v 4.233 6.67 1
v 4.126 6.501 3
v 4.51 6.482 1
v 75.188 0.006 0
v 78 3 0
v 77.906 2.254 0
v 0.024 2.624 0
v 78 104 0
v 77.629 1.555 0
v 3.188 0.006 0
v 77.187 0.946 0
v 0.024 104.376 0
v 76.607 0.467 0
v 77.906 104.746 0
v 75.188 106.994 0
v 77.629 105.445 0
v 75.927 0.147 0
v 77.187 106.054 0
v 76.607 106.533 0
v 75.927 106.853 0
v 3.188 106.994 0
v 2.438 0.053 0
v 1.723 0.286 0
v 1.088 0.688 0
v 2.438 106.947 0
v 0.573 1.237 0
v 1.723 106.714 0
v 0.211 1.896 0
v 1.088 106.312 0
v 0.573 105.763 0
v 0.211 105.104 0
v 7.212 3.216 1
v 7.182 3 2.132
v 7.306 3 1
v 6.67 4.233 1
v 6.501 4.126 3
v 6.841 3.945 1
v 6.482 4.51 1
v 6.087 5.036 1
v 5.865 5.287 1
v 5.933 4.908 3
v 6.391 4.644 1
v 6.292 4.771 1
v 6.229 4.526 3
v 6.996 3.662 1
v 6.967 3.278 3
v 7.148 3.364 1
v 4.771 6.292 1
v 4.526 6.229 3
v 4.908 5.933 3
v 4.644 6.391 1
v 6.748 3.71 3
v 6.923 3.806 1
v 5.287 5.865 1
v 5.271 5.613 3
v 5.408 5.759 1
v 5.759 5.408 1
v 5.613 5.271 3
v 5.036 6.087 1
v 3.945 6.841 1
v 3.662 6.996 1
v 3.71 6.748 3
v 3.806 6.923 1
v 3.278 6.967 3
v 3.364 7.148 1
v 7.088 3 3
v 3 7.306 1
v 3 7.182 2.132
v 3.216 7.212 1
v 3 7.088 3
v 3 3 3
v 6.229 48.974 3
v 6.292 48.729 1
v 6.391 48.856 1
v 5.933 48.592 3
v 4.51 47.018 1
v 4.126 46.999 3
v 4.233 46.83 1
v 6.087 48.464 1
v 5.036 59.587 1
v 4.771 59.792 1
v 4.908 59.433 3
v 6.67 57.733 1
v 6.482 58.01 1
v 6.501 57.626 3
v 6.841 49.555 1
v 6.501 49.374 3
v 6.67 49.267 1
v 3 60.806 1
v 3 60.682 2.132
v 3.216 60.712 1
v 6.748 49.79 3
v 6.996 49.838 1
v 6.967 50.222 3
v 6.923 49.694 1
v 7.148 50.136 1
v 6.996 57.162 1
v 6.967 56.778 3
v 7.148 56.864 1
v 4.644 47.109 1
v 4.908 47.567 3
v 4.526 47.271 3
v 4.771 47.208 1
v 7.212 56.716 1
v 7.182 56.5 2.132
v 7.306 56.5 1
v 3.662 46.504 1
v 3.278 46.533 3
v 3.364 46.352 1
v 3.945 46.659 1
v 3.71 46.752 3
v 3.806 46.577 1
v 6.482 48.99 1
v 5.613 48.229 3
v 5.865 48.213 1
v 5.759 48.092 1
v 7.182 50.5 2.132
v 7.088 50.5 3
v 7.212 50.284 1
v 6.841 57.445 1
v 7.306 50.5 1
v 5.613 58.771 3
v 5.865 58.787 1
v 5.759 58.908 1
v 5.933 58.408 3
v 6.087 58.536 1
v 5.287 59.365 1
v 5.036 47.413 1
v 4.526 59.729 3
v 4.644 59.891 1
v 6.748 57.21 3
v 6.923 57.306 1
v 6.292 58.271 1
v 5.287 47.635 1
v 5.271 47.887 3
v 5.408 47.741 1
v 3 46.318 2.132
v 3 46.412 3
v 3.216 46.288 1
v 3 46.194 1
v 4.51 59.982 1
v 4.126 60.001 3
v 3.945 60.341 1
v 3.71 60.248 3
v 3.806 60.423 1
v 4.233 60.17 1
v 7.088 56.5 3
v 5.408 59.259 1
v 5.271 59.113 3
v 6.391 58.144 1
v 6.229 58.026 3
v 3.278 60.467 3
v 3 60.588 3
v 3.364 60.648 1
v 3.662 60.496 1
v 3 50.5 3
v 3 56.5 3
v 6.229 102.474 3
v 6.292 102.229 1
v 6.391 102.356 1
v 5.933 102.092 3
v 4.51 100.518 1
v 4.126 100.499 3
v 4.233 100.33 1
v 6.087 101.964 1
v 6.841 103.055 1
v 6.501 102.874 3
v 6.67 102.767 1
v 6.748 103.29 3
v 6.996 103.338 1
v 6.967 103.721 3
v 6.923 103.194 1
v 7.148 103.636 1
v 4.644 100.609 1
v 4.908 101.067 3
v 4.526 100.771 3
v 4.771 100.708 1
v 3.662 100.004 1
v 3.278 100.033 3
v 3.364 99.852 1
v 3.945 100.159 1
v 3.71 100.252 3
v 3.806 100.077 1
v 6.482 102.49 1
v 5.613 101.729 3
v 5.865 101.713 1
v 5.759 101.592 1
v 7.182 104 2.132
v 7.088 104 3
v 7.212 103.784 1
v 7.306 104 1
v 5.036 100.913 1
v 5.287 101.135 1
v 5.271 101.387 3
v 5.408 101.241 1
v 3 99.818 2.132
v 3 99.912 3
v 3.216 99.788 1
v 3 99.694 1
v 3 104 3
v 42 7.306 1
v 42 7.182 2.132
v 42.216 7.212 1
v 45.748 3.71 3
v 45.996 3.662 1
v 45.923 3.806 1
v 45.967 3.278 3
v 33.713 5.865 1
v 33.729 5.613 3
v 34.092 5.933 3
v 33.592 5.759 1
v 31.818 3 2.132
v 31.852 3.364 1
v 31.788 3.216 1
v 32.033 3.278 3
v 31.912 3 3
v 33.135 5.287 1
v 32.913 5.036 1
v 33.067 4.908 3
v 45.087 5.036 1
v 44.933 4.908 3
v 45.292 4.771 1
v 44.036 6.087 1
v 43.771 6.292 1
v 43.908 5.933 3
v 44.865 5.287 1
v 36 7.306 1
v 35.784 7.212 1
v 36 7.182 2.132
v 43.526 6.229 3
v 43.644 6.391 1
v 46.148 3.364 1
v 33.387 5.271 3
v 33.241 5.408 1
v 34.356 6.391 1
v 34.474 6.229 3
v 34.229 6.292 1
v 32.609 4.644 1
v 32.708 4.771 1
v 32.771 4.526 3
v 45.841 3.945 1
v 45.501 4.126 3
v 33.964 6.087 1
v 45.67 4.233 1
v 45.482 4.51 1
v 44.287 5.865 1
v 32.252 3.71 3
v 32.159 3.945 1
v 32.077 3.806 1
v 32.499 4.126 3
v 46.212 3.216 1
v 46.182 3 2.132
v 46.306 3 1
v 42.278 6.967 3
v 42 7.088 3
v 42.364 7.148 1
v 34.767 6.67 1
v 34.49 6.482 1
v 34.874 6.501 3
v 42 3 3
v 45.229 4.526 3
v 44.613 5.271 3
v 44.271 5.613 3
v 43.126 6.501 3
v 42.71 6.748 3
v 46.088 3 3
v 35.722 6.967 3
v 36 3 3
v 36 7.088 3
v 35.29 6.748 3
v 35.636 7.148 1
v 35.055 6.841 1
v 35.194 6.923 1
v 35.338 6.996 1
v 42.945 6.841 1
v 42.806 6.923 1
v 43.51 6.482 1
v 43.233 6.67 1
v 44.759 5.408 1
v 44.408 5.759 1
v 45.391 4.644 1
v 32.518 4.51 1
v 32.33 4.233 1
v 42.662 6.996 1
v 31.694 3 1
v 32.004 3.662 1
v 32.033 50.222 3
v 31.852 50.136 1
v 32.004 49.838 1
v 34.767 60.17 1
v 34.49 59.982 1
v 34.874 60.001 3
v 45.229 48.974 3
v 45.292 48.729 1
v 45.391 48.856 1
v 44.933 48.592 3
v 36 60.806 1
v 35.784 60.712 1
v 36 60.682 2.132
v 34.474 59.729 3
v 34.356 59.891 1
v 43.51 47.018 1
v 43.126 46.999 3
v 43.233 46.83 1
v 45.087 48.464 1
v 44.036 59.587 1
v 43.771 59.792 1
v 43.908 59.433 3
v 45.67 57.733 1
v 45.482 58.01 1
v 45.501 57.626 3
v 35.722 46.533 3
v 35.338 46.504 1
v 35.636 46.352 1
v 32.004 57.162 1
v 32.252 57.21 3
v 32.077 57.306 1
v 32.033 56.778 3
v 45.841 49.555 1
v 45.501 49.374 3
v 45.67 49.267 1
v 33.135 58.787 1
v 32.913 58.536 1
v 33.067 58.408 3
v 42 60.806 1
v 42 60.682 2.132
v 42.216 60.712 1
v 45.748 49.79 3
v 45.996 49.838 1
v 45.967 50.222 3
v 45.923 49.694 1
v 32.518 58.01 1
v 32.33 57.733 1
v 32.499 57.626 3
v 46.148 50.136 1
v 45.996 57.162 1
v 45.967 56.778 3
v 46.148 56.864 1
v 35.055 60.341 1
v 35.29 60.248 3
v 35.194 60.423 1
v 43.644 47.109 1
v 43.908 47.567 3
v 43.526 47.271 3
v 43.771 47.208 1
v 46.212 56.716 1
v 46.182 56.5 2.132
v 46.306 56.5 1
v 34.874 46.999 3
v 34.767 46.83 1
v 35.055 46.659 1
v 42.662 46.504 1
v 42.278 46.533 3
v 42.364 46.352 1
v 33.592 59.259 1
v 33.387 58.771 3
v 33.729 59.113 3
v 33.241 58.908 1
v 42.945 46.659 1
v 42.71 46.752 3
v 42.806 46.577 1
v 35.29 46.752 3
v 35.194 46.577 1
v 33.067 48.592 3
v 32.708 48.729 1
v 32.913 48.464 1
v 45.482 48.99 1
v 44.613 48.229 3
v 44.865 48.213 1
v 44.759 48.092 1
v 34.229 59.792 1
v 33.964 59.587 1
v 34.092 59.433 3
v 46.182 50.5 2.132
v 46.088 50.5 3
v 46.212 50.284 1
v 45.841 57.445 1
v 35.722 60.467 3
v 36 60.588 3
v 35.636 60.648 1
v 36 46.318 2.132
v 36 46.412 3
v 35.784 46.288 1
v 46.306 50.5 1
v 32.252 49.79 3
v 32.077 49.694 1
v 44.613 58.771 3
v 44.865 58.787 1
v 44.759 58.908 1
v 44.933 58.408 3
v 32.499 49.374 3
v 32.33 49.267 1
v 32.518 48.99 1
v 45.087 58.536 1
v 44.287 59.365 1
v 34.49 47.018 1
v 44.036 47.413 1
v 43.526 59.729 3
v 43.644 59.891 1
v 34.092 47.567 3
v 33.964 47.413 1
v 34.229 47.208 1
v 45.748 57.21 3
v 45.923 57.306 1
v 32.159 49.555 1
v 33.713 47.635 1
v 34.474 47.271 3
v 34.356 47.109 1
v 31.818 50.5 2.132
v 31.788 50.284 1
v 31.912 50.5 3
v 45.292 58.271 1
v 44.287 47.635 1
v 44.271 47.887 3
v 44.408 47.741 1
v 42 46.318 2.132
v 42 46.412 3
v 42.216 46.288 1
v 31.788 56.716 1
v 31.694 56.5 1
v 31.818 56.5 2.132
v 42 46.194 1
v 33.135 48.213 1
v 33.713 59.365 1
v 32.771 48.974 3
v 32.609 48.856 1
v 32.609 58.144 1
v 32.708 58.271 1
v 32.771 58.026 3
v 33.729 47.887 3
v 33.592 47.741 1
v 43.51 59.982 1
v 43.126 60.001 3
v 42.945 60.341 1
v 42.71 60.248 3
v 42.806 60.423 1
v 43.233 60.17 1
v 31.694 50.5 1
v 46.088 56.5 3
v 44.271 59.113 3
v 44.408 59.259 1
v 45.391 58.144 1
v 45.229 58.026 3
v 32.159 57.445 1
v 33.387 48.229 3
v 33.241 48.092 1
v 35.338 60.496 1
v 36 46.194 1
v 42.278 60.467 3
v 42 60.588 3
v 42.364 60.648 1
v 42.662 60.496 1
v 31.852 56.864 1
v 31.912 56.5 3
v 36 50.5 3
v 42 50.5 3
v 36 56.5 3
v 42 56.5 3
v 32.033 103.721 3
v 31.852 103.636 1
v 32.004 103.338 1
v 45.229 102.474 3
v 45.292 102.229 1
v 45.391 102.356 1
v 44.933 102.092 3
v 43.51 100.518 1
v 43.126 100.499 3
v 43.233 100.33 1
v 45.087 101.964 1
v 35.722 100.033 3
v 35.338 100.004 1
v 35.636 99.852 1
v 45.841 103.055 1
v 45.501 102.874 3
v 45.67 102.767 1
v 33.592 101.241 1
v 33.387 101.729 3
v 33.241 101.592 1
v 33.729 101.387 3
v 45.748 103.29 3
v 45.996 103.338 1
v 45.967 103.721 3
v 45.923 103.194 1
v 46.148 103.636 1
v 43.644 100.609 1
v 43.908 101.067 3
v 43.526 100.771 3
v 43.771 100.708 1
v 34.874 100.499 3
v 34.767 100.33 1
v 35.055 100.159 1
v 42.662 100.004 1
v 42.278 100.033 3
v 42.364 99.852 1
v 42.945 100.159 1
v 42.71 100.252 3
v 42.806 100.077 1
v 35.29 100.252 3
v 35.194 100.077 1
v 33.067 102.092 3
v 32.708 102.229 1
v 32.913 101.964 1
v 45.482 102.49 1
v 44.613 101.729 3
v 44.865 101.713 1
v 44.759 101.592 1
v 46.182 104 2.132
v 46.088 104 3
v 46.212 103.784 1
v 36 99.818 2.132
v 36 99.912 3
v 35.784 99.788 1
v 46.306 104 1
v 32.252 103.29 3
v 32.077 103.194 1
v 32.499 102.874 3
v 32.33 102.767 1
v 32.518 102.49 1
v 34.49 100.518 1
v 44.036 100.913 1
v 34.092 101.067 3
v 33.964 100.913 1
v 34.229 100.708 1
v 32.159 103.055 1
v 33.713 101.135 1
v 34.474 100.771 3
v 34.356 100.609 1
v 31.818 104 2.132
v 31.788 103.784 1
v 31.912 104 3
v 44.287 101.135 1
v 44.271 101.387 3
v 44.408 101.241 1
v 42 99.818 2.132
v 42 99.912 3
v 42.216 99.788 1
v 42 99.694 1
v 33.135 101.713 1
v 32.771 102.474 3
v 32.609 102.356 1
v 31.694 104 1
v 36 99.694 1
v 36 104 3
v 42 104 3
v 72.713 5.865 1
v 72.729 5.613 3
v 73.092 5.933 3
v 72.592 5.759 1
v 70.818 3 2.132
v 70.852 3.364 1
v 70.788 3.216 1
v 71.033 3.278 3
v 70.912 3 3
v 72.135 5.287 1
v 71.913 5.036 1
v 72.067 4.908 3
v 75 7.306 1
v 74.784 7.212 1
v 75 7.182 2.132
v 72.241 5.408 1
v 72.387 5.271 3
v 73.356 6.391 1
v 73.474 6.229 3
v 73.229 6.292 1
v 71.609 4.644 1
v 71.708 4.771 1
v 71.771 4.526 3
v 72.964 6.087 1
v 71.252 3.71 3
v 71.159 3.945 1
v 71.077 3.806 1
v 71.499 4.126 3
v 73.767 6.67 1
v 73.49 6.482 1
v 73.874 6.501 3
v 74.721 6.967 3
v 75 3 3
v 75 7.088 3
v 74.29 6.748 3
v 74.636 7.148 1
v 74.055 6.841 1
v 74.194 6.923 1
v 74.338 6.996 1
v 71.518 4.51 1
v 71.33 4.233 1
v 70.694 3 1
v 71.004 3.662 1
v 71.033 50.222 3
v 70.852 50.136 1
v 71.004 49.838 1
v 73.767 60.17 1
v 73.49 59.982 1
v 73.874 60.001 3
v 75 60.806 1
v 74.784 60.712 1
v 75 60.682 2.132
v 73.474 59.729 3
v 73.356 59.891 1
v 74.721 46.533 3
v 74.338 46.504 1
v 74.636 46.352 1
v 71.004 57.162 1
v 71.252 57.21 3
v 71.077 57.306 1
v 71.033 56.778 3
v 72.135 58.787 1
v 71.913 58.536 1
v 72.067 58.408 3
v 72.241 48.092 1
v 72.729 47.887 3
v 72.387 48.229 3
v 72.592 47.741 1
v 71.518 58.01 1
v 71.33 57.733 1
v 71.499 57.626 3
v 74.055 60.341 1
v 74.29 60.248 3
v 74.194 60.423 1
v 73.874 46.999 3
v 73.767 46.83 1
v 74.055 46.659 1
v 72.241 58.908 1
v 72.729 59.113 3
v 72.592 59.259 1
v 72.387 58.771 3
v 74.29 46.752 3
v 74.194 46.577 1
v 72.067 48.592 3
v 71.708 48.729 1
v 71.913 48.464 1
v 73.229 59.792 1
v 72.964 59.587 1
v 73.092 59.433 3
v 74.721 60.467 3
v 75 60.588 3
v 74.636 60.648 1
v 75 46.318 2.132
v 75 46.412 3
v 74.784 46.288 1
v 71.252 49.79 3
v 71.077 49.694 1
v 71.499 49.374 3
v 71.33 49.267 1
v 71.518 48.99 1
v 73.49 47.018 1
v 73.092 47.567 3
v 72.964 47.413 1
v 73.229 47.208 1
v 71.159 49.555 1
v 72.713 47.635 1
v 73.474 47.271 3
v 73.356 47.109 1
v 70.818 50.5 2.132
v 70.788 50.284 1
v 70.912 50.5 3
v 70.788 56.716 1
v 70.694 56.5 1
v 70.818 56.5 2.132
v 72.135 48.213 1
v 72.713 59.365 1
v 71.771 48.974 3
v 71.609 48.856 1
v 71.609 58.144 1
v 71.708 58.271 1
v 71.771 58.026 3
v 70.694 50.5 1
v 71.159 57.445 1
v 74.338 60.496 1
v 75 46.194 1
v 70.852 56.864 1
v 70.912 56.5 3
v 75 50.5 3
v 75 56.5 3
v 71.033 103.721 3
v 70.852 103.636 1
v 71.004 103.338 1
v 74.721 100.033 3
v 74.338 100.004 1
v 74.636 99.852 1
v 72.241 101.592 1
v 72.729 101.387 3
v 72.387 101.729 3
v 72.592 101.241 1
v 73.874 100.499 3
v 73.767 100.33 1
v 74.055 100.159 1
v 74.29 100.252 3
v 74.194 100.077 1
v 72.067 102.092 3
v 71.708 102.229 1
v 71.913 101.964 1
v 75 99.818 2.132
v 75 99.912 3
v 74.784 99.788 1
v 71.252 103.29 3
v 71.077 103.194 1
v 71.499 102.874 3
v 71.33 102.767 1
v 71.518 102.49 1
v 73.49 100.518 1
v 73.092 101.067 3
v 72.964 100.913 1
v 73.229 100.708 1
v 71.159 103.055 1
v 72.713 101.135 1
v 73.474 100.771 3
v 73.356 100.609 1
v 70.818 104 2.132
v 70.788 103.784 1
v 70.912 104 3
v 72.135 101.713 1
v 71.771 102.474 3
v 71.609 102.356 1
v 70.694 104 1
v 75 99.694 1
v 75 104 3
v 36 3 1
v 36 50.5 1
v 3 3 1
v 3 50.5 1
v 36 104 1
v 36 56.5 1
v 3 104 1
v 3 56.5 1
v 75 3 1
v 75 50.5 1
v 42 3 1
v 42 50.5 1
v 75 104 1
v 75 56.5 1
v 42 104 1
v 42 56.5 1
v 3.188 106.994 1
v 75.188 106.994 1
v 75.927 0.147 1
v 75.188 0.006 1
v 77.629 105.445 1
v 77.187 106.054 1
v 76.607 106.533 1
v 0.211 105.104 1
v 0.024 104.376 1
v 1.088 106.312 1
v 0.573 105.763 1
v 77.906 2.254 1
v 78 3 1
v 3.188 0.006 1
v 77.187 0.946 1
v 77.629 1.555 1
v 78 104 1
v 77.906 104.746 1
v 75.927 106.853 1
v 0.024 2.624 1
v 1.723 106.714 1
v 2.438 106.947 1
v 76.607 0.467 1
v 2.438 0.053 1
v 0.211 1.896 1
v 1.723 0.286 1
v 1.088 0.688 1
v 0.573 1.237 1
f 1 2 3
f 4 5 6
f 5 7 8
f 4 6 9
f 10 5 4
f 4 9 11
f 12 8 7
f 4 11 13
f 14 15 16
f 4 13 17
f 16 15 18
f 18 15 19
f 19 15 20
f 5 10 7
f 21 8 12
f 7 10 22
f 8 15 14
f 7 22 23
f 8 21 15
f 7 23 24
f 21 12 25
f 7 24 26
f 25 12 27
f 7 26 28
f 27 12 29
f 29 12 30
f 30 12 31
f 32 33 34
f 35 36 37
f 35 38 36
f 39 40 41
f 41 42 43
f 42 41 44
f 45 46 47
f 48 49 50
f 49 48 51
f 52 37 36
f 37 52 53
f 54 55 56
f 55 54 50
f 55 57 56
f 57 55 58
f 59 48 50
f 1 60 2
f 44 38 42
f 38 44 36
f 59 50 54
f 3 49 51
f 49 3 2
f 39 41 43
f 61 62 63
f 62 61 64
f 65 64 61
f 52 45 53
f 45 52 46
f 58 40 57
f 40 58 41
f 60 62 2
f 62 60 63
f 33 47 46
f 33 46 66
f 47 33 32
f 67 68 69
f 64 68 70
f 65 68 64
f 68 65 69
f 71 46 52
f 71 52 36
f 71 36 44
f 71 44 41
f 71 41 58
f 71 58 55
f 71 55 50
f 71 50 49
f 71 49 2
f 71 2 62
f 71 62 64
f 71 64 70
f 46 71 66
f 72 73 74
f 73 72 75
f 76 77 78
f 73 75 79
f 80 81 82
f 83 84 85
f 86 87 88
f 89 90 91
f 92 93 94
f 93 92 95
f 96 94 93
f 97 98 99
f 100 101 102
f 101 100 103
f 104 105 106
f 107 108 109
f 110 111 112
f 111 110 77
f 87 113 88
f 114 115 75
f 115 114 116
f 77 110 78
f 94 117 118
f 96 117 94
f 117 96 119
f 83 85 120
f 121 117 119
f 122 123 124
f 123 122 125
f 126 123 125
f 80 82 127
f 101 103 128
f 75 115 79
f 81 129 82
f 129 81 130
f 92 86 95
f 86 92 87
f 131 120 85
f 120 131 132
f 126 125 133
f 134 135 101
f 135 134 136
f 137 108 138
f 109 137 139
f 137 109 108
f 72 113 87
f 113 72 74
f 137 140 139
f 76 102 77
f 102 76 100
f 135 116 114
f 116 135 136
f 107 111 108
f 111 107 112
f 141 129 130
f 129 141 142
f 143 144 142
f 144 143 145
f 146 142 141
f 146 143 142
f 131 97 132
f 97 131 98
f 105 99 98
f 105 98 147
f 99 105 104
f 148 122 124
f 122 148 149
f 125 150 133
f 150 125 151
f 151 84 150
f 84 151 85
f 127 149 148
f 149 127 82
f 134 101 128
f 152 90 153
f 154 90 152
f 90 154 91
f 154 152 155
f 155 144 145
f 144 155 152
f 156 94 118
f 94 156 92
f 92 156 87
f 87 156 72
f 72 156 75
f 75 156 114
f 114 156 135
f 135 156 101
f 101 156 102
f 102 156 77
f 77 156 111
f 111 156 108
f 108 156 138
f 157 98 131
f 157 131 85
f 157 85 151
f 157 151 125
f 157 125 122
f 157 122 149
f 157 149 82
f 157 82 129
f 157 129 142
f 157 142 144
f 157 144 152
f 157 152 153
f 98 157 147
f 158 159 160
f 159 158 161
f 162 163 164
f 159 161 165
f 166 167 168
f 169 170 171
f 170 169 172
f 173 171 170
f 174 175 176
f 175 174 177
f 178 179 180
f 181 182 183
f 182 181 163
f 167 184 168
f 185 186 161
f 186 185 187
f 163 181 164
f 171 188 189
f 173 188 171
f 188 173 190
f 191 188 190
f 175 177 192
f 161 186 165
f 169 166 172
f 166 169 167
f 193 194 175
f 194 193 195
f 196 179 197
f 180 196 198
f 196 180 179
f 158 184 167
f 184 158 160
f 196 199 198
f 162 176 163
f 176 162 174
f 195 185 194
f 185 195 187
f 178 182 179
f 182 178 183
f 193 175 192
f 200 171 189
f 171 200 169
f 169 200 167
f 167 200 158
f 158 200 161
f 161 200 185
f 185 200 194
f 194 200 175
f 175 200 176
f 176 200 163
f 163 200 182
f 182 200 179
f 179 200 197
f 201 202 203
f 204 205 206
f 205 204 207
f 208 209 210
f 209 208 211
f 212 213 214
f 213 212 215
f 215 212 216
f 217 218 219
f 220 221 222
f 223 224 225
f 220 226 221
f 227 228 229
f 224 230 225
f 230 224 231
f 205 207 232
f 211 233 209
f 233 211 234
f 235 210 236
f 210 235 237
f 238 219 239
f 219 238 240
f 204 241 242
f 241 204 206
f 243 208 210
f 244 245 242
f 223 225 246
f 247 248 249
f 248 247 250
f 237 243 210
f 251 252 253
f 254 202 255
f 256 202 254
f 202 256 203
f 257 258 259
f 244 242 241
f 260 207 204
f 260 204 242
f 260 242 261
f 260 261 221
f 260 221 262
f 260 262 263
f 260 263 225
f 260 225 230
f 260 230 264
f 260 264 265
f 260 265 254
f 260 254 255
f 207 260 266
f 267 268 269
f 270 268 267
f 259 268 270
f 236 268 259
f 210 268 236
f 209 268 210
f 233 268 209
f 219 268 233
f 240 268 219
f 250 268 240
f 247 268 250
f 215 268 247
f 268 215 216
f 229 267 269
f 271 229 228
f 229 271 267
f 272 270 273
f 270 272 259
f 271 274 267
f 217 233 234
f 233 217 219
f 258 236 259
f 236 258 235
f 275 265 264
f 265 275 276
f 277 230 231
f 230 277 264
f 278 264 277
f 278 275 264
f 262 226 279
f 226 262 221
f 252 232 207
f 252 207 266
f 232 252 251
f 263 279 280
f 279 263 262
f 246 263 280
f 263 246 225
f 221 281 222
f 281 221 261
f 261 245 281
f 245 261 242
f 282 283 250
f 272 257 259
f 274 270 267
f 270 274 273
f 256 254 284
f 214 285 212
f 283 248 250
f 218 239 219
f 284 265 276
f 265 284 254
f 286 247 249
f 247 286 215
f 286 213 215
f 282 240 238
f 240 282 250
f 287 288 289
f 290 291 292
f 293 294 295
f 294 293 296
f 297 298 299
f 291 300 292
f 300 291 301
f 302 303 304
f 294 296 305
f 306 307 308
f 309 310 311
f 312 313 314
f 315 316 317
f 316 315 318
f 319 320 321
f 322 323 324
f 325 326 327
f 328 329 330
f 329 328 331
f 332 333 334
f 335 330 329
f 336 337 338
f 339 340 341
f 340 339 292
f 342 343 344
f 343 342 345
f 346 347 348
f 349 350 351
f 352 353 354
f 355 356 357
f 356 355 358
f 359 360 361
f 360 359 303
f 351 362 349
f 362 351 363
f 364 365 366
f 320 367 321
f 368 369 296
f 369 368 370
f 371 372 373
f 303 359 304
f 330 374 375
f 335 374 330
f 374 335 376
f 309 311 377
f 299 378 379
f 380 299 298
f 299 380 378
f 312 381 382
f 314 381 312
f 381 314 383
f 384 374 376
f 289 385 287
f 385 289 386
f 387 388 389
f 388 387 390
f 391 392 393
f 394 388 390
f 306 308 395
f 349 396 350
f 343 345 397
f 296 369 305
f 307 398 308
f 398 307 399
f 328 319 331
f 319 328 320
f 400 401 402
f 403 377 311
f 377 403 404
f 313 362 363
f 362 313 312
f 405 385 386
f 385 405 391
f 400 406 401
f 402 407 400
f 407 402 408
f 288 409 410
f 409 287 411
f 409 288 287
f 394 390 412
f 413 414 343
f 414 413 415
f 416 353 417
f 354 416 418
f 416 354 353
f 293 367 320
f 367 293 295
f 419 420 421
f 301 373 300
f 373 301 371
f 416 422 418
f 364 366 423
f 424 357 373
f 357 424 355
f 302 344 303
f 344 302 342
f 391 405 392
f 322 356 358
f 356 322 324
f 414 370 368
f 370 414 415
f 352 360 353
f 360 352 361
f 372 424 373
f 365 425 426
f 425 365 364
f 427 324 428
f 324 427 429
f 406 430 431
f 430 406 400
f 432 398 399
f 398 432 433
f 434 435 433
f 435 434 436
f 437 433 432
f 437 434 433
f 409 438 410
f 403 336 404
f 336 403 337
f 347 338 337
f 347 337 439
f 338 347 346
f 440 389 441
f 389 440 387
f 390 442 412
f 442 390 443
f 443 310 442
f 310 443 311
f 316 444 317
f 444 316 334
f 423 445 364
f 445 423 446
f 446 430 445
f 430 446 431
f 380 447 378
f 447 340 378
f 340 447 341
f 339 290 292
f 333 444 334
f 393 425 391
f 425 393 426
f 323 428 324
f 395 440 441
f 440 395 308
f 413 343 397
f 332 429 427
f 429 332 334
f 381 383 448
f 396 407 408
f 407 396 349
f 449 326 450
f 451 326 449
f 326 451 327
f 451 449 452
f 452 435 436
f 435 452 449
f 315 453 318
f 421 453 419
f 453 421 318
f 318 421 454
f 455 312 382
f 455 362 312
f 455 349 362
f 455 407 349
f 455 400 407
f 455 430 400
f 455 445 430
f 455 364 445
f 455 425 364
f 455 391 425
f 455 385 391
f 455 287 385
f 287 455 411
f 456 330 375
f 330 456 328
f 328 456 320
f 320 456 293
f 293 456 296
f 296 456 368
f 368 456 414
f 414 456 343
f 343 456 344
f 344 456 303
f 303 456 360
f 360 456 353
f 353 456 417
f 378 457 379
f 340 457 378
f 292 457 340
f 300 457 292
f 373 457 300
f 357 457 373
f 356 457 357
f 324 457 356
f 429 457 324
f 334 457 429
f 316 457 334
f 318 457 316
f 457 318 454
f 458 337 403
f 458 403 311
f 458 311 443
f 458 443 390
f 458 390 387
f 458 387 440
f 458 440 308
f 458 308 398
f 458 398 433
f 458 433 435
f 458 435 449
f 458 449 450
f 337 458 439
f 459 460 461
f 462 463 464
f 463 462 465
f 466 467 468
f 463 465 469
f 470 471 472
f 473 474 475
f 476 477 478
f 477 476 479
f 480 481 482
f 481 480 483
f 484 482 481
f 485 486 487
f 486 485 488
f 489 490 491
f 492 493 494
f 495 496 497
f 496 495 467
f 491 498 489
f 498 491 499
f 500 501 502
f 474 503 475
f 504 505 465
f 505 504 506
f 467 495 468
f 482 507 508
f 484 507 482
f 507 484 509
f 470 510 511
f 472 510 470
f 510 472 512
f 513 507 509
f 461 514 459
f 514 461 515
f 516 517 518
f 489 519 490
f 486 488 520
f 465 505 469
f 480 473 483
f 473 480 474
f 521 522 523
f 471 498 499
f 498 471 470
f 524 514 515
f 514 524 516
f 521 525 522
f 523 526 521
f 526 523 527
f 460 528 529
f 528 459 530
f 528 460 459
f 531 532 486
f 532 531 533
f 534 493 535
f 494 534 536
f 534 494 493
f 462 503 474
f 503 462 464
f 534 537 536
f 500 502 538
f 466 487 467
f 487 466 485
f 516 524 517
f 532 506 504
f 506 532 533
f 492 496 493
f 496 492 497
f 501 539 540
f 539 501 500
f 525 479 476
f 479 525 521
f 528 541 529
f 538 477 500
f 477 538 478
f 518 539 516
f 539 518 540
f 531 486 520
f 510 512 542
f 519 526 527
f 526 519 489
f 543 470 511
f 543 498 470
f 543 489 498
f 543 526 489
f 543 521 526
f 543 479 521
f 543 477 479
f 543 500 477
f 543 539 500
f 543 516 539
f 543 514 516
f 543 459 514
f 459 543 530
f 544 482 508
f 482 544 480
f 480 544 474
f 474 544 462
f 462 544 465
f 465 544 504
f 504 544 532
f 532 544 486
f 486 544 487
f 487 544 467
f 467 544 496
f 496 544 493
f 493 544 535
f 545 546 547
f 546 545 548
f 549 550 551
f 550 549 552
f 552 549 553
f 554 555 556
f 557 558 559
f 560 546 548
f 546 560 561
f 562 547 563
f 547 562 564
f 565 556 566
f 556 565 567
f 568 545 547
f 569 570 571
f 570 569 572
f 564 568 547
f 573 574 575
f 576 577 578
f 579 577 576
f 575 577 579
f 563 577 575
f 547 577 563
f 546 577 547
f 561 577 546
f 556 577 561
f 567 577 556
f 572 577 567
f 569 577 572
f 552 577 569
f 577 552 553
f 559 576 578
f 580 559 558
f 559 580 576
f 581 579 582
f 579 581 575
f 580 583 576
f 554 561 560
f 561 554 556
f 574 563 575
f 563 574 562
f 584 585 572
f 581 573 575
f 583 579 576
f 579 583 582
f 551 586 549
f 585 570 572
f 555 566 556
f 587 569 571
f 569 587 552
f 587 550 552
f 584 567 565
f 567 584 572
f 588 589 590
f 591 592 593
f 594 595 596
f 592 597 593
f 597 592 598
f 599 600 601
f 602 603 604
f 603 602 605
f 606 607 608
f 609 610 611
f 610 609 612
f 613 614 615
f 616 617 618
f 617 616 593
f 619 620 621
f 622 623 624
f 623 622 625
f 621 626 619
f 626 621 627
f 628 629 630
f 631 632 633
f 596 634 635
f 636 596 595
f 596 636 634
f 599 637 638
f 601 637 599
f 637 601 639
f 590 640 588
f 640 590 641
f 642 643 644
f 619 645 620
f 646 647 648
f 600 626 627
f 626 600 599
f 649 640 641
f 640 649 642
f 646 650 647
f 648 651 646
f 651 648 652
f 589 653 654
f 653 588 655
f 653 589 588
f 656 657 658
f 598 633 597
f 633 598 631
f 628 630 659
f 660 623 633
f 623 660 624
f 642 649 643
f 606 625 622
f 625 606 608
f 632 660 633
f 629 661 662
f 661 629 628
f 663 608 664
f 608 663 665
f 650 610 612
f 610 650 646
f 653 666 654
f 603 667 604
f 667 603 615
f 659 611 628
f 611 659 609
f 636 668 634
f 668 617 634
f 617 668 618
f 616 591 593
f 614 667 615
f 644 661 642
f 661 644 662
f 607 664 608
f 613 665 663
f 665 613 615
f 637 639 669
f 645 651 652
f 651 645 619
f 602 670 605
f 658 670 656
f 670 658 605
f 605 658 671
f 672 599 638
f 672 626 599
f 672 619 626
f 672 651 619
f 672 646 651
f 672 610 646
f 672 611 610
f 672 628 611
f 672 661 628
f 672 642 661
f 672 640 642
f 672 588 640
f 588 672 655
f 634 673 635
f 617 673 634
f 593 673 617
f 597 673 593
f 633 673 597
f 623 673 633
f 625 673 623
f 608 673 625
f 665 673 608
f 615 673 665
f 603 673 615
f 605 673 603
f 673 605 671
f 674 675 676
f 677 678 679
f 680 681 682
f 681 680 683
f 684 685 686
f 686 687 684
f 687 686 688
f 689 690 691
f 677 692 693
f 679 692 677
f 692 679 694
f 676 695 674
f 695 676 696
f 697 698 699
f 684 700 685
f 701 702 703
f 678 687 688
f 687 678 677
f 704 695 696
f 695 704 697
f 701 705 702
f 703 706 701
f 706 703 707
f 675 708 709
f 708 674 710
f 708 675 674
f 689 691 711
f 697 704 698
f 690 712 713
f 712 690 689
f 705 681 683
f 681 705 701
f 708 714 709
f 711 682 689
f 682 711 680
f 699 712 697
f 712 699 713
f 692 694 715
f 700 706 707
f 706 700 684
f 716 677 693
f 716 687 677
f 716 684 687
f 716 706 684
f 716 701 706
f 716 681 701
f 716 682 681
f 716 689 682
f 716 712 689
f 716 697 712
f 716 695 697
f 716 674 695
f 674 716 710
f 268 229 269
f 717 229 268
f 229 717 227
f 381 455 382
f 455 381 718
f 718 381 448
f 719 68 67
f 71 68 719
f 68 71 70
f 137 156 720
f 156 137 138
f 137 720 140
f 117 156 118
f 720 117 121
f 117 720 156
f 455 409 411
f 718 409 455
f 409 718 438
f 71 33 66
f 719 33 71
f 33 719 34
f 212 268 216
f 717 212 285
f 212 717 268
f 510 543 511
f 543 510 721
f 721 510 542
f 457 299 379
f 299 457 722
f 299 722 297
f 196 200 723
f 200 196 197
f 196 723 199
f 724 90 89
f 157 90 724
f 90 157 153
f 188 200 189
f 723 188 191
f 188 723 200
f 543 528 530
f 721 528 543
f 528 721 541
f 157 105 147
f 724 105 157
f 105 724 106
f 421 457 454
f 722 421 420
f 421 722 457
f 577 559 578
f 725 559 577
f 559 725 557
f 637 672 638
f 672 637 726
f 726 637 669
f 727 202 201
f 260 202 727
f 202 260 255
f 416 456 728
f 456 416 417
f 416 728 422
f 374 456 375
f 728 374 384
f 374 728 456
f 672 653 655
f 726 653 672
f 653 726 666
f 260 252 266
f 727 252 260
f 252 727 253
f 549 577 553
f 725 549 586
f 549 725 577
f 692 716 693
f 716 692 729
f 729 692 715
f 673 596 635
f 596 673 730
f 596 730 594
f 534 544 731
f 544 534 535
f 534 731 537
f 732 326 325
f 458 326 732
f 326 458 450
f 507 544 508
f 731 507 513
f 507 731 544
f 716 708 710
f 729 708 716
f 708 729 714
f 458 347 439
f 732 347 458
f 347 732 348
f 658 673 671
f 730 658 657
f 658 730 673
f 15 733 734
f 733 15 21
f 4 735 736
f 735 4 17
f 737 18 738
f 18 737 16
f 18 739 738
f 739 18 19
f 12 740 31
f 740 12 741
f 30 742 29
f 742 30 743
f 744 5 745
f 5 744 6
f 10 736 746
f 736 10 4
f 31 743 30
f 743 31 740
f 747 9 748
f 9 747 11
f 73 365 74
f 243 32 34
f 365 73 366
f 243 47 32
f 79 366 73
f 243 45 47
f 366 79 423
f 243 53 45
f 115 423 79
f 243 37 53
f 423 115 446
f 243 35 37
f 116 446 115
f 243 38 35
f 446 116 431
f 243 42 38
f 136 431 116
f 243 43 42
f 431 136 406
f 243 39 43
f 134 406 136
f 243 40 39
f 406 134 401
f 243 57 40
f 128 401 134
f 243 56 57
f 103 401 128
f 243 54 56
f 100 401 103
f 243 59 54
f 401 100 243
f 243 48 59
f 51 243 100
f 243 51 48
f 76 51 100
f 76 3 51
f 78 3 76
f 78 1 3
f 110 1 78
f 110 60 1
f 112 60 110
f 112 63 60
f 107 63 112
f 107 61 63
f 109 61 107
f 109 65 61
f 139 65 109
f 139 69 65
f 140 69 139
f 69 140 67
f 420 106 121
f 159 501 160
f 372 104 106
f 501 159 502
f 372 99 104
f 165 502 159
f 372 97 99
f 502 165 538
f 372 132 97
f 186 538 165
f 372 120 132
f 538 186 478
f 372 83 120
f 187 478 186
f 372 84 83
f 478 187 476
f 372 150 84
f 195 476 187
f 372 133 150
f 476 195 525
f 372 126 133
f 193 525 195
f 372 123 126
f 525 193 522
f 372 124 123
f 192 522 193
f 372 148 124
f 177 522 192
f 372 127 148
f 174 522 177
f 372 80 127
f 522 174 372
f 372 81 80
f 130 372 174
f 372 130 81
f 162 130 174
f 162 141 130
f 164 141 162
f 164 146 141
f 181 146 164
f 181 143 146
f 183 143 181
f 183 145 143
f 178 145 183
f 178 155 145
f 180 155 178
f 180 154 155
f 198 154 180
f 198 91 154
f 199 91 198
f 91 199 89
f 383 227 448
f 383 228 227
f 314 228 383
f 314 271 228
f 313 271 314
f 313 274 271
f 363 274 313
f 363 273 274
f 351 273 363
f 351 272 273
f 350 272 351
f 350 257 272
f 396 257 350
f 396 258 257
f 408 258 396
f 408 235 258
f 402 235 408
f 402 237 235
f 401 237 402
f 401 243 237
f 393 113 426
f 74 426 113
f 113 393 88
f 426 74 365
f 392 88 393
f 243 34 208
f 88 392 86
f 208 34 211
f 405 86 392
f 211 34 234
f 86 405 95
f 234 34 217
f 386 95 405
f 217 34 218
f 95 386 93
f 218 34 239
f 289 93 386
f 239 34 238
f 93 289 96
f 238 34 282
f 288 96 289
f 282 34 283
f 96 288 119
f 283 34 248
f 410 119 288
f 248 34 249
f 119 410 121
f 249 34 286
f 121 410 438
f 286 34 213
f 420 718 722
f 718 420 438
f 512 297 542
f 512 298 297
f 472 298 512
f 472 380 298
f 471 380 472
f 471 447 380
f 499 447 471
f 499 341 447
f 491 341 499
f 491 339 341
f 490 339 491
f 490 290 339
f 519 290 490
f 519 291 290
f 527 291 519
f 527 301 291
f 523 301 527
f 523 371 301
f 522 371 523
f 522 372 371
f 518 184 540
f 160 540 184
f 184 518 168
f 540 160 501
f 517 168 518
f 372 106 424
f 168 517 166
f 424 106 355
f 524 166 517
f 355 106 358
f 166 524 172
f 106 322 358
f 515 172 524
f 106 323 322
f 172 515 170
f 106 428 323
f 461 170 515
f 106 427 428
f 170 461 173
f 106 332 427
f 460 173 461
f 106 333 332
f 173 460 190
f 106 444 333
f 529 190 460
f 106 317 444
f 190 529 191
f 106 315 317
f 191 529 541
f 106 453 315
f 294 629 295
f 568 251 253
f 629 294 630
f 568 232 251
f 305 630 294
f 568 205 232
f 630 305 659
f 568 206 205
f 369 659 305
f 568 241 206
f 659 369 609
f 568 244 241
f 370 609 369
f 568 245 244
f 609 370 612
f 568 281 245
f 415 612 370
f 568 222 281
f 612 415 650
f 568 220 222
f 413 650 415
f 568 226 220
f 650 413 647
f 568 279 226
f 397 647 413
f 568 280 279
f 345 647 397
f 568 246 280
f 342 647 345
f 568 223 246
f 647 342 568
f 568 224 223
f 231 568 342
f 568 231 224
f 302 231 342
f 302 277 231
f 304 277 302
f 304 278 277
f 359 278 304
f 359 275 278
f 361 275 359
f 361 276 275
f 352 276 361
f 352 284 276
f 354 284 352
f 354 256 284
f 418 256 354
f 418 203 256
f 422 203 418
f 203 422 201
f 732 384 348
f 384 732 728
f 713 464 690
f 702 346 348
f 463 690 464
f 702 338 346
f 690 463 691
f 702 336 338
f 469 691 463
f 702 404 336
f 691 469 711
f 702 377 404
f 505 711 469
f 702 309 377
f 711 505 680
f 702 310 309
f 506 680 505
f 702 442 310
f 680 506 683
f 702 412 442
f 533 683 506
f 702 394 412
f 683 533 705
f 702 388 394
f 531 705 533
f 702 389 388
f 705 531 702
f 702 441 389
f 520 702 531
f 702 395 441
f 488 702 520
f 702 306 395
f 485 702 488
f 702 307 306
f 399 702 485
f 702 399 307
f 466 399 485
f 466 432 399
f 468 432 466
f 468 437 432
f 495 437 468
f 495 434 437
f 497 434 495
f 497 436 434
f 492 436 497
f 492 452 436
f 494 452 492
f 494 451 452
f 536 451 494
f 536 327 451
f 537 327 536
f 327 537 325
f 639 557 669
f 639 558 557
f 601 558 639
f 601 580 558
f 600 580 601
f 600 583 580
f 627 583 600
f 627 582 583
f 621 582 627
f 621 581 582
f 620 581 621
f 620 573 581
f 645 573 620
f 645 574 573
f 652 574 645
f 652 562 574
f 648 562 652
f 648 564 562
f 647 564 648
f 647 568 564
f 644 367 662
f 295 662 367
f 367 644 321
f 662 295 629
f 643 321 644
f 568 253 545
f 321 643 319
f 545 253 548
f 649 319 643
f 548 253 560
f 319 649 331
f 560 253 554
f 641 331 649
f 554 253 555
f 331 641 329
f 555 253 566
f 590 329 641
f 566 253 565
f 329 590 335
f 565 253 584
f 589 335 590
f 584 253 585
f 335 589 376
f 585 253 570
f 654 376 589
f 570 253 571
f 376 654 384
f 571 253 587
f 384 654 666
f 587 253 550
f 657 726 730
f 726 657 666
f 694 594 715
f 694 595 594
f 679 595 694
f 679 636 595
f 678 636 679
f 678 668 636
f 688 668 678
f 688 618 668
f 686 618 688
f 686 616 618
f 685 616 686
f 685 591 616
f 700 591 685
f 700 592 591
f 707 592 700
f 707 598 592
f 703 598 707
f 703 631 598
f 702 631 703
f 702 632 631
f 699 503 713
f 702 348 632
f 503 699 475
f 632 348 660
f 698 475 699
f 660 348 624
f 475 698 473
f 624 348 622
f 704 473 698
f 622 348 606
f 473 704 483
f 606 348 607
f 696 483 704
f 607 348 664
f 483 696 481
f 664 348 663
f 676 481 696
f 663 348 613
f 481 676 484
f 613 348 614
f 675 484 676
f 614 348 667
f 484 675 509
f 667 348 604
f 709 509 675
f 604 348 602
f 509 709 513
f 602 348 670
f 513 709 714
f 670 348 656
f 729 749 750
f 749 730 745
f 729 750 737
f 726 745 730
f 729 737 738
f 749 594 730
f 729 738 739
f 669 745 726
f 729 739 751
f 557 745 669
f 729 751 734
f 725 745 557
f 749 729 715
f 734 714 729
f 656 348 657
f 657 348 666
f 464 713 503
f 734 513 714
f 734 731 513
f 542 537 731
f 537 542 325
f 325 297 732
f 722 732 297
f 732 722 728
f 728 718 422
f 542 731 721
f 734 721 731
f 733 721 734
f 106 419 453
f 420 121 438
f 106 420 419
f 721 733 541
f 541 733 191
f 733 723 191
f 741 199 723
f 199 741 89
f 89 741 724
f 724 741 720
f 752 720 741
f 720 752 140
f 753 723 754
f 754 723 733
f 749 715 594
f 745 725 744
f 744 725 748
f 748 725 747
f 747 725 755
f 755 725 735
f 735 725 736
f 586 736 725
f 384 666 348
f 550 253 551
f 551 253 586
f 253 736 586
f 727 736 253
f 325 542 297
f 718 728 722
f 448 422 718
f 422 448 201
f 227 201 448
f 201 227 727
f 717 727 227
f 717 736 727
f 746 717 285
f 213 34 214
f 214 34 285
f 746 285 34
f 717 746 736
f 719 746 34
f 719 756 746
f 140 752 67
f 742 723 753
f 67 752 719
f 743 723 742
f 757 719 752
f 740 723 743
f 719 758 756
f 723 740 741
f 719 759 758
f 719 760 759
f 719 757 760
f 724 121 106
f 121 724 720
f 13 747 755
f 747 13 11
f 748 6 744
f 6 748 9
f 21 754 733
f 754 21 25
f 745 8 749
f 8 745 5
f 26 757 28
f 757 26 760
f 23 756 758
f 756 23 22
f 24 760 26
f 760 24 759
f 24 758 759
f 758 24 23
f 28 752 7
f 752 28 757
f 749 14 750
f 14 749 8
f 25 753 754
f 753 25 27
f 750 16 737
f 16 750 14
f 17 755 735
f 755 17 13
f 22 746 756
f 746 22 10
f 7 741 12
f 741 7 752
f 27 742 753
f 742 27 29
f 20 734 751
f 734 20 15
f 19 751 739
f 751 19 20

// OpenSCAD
x_length = 2;
y_length = 2;

// The stanley cases have two bins on either side of the handle.  Those bins need to only have nubs on the corners.  The side bins should also be 2 for both x an y
middle_nubs = "yes"; // [yes,no]

// ignore variable values
middle = middle_nubs == "yes";

module stanley_base(x, y, middle=true) {
    hull() {
        translate([3,3,0]) cylinder(1,3,3,$fn=25);
        translate([39*x-3,3,0]) cylinder(1,3,3,$fn=25);
        translate([3,53.5*y-3,0]) cylinder(1,3,3,$fn=25);
        translate([39*x-3,53.5*y-3,0]) cylinder(1,3,3,$fn=25);
    }
    if (middle) {
        intersection() {
            union() {
                for (i = [0:x]) {
                    for (j = [0:y]) {
                        translate([39*i,53.5*j,0]) cylinder(3,8,7.7,$fn=100);
                    }
                }
            }
            union() {
                for (i = [1:x]) {
                    for (j = [1:y]) {
                        translate([39*(i-1), 53.5*(j-1), 0]) translate([3,3,0]) cube([33,47.5,3.1]);
                    }
                }
            }
        }
    } else {
        intersection() {
            union() {
                translate([39*0,53.5*0,0]) cylinder(3,8,7.7,$fn=100);
                translate([39*0,53.5*y,0]) cylinder(3,8,7.7,$fn=100);
                translate([39*x,53.5*0,0]) cylinder(3,8,7.7,$fn=100);
                translate([39*x,53.5*y,0]) cylinder(3,8,7.7,$fn=100);
           }
           union() {
                for (i = [1:x]) {
                    for (j = [1:y]) {
                        translate([39*(i-1), 53.5*(j-1), 0]) translate([3,3,0]) cube([33,47.5,3.1]);
                    }
                }
            }
        }
    }
}

stanley_base(x_length, y_length, middle);
